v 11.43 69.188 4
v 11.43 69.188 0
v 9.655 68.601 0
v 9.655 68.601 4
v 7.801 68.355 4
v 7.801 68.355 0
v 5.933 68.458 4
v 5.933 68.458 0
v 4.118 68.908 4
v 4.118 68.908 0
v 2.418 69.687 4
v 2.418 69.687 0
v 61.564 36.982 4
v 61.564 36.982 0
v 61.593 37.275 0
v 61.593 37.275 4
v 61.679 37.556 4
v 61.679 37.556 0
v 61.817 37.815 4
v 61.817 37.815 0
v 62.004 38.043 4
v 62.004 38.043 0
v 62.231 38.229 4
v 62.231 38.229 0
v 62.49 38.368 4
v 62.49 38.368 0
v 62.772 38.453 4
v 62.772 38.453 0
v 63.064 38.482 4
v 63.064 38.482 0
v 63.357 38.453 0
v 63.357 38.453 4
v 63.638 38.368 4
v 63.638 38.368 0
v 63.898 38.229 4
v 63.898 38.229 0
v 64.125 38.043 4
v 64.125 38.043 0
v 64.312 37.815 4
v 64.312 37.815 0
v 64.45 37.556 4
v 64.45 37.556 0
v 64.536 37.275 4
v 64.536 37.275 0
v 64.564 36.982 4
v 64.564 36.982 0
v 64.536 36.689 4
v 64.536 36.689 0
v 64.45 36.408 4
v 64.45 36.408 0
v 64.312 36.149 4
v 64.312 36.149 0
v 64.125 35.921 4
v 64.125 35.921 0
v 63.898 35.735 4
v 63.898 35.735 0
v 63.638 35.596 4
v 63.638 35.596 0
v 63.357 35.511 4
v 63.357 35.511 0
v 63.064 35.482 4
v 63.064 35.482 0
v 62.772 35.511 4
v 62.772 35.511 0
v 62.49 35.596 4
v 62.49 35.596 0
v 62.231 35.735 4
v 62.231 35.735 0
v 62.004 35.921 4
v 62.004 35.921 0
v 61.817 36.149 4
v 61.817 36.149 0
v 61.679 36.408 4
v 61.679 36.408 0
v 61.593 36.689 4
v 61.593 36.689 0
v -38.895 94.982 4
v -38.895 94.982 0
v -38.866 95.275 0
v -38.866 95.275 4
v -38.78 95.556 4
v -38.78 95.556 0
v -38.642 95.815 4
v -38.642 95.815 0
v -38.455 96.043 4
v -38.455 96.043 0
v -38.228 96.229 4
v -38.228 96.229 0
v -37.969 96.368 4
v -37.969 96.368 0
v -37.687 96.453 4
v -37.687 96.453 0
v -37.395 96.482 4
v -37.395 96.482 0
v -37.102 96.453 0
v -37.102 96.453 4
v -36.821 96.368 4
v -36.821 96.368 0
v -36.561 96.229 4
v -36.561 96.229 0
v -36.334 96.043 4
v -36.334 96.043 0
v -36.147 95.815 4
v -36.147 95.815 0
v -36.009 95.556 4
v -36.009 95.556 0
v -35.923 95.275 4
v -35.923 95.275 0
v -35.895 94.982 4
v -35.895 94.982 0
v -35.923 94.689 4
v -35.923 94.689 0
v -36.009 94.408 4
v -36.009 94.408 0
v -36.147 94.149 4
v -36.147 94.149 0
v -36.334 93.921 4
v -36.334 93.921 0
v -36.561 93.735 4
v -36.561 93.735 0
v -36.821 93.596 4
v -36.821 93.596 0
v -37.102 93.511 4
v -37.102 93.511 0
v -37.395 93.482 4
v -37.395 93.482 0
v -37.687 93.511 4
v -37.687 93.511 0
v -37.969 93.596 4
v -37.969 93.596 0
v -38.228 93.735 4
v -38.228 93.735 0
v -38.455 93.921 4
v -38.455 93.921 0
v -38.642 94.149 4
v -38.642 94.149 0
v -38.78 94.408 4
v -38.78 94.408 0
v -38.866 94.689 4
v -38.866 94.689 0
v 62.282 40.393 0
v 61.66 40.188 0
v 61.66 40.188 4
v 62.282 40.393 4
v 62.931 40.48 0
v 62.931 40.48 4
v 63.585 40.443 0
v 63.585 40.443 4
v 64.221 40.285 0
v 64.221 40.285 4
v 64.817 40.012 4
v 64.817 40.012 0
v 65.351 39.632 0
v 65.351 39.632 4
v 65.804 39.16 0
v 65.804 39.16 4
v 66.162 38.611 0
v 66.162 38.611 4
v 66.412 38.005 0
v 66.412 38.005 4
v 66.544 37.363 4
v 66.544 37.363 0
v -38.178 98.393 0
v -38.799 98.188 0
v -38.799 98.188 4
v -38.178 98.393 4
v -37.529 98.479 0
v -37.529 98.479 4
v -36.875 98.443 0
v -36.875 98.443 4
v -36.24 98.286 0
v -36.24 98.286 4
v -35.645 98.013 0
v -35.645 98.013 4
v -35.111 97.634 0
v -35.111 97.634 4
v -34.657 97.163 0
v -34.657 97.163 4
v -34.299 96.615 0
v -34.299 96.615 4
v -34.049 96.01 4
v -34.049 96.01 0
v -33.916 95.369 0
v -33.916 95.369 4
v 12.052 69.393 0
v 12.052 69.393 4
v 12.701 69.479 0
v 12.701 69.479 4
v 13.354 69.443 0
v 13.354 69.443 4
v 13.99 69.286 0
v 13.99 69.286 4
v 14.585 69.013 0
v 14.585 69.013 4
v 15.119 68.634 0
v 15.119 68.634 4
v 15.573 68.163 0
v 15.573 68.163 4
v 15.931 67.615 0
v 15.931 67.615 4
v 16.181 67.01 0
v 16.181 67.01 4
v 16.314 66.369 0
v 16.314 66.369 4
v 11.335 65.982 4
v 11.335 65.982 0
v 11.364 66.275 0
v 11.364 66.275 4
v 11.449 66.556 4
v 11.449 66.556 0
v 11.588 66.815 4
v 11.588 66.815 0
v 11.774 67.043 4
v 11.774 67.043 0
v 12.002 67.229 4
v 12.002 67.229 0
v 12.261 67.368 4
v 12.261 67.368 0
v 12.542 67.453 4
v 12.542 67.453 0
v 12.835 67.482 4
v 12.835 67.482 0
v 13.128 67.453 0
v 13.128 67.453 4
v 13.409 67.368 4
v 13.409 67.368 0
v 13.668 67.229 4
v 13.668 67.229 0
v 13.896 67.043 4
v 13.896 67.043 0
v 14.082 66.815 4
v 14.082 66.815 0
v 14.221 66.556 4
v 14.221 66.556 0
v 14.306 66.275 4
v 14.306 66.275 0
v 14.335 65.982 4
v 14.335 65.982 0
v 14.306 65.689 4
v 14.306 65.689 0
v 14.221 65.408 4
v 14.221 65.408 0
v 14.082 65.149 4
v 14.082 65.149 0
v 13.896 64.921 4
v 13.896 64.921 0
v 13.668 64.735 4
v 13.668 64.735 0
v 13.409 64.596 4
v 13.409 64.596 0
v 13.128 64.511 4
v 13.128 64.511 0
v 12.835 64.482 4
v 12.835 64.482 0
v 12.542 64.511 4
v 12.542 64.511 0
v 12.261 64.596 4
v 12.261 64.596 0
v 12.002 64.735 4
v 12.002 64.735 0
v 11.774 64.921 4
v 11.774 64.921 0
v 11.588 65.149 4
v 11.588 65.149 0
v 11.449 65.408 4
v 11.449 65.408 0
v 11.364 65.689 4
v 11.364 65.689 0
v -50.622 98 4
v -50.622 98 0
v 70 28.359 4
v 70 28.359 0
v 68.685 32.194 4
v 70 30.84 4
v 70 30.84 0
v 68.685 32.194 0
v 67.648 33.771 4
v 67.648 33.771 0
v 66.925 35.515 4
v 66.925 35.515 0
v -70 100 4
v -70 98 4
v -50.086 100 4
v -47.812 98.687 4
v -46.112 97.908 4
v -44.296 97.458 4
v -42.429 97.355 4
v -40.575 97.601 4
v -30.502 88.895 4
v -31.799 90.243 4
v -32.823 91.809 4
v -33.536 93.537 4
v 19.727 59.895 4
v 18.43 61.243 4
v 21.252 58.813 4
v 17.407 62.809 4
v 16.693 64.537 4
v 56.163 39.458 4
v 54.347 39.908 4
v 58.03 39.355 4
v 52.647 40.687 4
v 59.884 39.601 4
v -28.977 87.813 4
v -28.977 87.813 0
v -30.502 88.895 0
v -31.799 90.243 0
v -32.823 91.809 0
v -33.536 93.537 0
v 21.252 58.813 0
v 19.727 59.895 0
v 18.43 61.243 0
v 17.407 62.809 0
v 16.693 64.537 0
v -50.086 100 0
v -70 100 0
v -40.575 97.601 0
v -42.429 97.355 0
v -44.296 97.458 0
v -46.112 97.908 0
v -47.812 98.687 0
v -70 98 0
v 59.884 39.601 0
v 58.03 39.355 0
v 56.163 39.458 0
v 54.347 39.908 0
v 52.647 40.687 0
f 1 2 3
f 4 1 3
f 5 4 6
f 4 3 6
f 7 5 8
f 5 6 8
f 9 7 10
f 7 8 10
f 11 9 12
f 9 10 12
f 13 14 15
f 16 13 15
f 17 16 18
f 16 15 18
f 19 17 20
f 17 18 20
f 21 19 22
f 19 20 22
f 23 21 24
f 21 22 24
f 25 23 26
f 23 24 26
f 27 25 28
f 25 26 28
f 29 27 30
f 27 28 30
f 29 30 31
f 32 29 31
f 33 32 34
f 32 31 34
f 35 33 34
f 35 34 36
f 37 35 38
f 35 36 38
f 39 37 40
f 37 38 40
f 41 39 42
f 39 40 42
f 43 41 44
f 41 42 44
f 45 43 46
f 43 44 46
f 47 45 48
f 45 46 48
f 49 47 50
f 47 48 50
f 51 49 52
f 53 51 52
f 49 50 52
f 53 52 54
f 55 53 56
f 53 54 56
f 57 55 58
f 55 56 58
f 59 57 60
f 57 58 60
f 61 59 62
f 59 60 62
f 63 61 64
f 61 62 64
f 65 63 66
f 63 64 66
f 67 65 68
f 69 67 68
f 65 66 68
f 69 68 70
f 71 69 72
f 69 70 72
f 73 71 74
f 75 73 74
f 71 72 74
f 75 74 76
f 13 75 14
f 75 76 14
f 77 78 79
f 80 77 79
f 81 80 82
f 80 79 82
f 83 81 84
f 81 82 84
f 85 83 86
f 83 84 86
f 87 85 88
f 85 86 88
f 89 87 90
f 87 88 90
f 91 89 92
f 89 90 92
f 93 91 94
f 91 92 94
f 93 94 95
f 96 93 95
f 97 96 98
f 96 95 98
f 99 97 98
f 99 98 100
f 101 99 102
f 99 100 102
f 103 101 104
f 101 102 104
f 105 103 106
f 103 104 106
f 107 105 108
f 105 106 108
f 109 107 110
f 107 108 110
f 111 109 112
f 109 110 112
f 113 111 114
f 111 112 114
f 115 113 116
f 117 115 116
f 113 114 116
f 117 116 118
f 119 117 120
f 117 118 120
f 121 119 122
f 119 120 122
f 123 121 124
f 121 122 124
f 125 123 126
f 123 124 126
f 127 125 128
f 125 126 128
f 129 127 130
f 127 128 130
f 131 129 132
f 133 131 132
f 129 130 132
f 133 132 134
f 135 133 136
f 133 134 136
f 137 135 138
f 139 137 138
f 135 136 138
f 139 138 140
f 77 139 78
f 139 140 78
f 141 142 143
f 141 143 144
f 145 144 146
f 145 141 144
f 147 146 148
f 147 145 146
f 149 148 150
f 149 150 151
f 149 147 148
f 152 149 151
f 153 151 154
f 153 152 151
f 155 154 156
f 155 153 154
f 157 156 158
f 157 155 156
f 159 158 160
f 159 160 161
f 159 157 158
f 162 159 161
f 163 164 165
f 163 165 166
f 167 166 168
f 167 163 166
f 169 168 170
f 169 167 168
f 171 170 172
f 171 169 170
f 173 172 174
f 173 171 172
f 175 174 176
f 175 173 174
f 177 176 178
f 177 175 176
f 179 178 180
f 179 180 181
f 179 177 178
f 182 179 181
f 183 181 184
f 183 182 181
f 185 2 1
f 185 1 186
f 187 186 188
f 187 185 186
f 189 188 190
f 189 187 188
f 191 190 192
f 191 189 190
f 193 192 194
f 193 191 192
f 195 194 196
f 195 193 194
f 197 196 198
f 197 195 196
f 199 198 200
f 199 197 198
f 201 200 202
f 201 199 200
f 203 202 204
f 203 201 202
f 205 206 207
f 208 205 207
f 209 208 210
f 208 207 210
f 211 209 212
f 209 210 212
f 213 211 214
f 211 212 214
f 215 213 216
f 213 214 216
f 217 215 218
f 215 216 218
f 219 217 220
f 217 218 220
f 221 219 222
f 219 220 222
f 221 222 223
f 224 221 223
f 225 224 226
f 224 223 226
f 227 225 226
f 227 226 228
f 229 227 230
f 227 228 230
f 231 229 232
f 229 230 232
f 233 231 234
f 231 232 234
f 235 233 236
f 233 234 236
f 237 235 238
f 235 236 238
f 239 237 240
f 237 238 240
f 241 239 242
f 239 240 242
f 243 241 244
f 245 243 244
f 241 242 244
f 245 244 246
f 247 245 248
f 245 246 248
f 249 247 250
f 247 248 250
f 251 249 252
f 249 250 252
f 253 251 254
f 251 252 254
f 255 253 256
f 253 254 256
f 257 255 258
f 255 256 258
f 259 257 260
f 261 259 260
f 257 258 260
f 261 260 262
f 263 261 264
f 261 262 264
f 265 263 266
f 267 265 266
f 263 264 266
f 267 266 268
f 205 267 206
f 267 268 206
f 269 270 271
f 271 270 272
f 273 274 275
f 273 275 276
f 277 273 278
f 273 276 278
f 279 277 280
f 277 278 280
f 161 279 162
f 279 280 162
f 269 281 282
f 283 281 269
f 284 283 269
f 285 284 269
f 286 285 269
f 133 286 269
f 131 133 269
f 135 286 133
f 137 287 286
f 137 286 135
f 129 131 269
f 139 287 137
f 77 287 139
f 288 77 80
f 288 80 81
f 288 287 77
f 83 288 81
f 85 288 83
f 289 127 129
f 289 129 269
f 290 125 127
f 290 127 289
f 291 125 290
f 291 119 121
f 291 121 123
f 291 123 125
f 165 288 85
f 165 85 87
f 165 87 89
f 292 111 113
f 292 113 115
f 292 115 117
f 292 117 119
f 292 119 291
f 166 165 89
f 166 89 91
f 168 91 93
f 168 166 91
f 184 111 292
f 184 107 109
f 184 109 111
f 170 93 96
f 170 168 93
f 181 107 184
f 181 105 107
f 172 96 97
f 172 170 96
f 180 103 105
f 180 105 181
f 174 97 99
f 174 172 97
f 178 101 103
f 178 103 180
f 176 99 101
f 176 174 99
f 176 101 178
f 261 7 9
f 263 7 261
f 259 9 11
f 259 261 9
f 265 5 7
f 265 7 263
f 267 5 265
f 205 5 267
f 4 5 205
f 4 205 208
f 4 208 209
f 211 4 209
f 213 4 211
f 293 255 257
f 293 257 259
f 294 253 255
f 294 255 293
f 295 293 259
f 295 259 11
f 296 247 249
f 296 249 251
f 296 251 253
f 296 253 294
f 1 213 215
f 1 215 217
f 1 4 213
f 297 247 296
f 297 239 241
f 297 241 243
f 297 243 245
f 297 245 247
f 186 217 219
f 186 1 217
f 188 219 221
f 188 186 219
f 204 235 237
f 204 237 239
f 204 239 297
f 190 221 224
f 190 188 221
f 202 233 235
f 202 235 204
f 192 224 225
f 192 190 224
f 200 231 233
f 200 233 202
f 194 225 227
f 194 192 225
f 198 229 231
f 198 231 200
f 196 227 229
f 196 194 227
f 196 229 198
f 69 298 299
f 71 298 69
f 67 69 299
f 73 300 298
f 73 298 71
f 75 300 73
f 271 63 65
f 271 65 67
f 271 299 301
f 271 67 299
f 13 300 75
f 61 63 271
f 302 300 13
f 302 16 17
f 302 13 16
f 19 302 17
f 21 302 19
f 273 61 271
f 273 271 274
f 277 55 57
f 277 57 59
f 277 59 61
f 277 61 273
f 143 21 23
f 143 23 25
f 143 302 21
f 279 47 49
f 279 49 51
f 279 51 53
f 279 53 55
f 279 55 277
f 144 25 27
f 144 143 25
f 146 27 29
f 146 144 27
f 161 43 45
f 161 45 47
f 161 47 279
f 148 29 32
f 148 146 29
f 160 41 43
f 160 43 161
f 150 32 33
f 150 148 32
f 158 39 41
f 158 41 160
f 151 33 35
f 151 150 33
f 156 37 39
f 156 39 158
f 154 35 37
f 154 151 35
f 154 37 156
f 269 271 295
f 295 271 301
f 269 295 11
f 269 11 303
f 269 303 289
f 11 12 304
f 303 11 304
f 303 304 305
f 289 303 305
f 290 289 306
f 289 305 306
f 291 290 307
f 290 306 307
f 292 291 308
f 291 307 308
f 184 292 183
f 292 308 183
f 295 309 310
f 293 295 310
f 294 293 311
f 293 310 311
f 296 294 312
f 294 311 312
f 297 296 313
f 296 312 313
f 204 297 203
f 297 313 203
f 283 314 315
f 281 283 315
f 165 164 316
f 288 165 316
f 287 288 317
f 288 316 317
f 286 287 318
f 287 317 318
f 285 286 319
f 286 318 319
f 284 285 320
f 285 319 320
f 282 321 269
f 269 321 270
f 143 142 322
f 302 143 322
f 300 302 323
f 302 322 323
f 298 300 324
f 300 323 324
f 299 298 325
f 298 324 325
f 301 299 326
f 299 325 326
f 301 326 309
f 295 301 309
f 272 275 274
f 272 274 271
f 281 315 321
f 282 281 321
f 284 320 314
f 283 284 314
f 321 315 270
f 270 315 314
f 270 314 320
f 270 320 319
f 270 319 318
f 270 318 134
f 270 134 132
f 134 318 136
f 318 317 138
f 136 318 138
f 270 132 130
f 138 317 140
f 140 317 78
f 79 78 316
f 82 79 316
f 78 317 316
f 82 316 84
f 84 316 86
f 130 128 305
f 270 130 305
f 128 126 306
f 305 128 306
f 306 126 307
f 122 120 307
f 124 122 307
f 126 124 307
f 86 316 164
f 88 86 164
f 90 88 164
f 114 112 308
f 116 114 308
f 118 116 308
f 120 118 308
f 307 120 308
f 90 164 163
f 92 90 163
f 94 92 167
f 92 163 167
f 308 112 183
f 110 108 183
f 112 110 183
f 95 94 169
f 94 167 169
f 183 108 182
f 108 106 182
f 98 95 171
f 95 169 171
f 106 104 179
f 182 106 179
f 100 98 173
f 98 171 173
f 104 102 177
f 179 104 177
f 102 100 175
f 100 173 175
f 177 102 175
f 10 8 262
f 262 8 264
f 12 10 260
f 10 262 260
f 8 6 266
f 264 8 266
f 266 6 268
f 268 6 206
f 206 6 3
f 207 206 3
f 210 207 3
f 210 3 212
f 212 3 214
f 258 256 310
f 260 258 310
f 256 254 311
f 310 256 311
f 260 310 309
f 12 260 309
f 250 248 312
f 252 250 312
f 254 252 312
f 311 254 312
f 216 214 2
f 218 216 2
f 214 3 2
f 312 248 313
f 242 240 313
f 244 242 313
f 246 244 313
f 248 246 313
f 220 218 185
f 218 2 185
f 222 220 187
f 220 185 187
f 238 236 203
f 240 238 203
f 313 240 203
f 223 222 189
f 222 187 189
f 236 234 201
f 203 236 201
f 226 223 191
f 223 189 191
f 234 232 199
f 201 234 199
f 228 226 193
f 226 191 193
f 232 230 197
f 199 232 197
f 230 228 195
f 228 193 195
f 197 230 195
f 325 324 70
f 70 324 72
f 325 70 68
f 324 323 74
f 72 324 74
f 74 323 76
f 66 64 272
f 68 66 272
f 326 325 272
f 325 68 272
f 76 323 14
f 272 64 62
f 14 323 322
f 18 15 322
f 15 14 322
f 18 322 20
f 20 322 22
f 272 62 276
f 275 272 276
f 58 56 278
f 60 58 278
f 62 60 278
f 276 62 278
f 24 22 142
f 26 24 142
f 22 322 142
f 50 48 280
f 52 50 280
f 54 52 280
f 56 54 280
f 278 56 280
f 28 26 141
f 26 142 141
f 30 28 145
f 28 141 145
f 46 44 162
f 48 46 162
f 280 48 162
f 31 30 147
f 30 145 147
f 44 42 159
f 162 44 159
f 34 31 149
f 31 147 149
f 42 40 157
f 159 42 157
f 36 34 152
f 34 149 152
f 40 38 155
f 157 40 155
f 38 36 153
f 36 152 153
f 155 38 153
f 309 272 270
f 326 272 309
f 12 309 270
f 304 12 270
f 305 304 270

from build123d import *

# Parameters (mm, degrees)
EXTRUDE_THIN1_DEPTH = 4
SKETCH4_R           = 1.5
BOSS_EXTRUDE1_DEPTH = 4
FILLET1_DEPTH       = 4
CUT_EXTRUDE2_START  = -4
CUT_EXTRUDE2_DEPTH  = 4


with BuildPart() as part:
    # Sketch1 → Extrude-Thin1 (new body)
    with BuildSketch(Plane.XY):
        Polygon((-70, 98), (-50.621778265, 98), (70, 28.358983849), (71, 30.091034656), (-50.08587988, 100), (-70, 100), align=None)
    extrude(amount=EXTRUDE_THIN1_DEPTH)

    # Sketch4 → Boss-Extrude1 (add)
    # profile 1 of 9: a face of its own
    with BuildSketch(Plane(origin=(0, 0, 0), x_dir=(-1, 0, 0), z_dir=(0, 0, -1))):
        with BuildLine():
            ThreePointArc((40.894536929, 94.982050808), (40.775277321, 95.887917465), (40.425625842, 96.732050808))
            ThreePointArc((40.425625842, 96.732050808), (35.644536929, 98.013139721), (34.363448016, 93.232050808))
            ThreePointArc((34.363448016, 93.232050808), (35.026593255, 92.40467952), (35.907068336, 91.813859338))
            Line((35.907068336, 91.813859338), (40.882005522, 94.686140662))
            ThreePointArc((40.882005522, 94.686140662), (40.891402674, 94.833963122), (40.894536929, 94.982050808))
        make_face()
        with Locations((37.394536929, 94.982050808)):
            Circle(SKETCH4_R, mode=Mode.SUBTRACT)
    # profile 2 of 9: a face of its own
    with BuildSketch(Plane(origin=(0, 0, 0), x_dir=(-1, 0, 0), z_dir=(0, 0, -1))):
        with BuildLine():
            Line((41.425625842, 95), (40.425625842, 96.732050808))
            ThreePointArc((40.425625842, 96.732050808), (40.775277321, 95.887917465), (40.894536929, 94.982050808))
            ThreePointArc((40.894536929, 94.982050808), (40.891402674, 94.833963122), (40.882005522, 94.686140662))
            Line((40.882005522, 94.686140662), (41.425625842, 95))
        make_face()
    # profile 3 of 9: a face of its own
    with BuildSketch(Plane(origin=(0, 0, 0), x_dir=(-1, 0, 0), z_dir=(0, 0, -1))):
        with BuildLine():
            ThreePointArc((35.907068336, 91.813859338), (35.026593255, 92.40467952), (34.363448016, 93.232050808))
            Line((34.363448016, 93.232050808), (35.363448016, 91.5))
            Line((35.363448016, 91.5), (35.907068336, 91.813859338))
        make_face()
    # profile 4 of 9: a face of its own
    with BuildSketch(Plane(origin=(0, 0, 0), x_dir=(-1, 0, 0), z_dir=(0, 0, -1))):
        with BuildLine():
            ThreePointArc((-9.334936491, 65.982050808), (-9.454196099, 66.887917465), (-9.803847577, 67.732050808))
            ThreePointArc((-9.803847577, 67.732050808), (-14.584936491, 69.013139721), (-15.866025404, 64.232050808))
            ThreePointArc((-15.866025404, 64.232050808), (-15.202880165, 63.40467952), (-14.322405083, 62.813859338))
            Line((-14.322405083, 62.813859338), (-9.347467898, 65.686140662))
            ThreePointArc((-9.347467898, 65.686140662), (-9.338070746, 65.833963122), (-9.334936491, 65.982050808))
        make_face()
        with Locations((-12.834936491, 65.982050808)):
            Circle(SKETCH4_R, mode=Mode.SUBTRACT)
    # profile 5 of 9: a face of its own
    with BuildSketch(Plane(origin=(0, 0, 0), x_dir=(-1, 0, 0), z_dir=(0, 0, -1))):
        with BuildLine():
            ThreePointArc((-14.322405083, 62.813859338), (-15.202880165, 63.40467952), (-15.866025404, 64.232050808))
            Line((-15.866025404, 64.232050808), (-14.866025404, 62.5))
            Line((-14.866025404, 62.5), (-14.322405083, 62.813859338))
        make_face()
    # profile 6 of 9: a face of its own
    with BuildSketch(Plane(origin=(0, 0, 0), x_dir=(-1, 0, 0), z_dir=(0, 0, -1))):
        with BuildLine():
            Line((-9.347467898, 65.686140662), (-8.803847577, 66))
            Line((-8.803847577, 66), (-9.803847577, 67.732050808))
            ThreePointArc((-9.803847577, 67.732050808), (-9.454196099, 66.887917465), (-9.334936491, 65.982050808))
            ThreePointArc((-9.334936491, 65.982050808), (-9.338070746, 65.833963122), (-9.347467898, 65.686140662))
        make_face()
    # profile 7 of 9: a face of its own
    with BuildSketch(Plane(origin=(0, 0, 0), x_dir=(-1, 0, 0), z_dir=(0, 0, -1))):
        with BuildLine():
            ThreePointArc((-59.56440991, 36.982050808), (-59.683669518, 37.887917465), (-60.033320997, 38.732050808))
            ThreePointArc((-60.033320997, 38.732050808), (-64.81440991, 40.013139721), (-66.095498823, 35.232050808))
            ThreePointArc((-66.095498823, 35.232050808), (-65.432353584, 34.40467952), (-64.551878503, 33.813859338))
            Line((-64.551878503, 33.813859338), (-59.576941317, 36.686140662))
            ThreePointArc((-59.576941317, 36.686140662), (-59.567544165, 36.833963122), (-59.56440991, 36.982050808))
        make_face()
        with Locations((-63.06440991, 36.982050808)):
            Circle(SKETCH4_R, mode=Mode.SUBTRACT)
    # profile 8 of 9: a face of its own
    with BuildSketch(Plane(origin=(0, 0, 0), x_dir=(-1, 0, 0), z_dir=(0, 0, -1))):
        with BuildLine():
            ThreePointArc((-64.551878503, 33.813859338), (-65.432353584, 34.40467952), (-66.095498823, 35.232050808))
            Line((-66.095498823, 35.232050808), (-65.095498823, 33.5))
            Line((-65.095498823, 33.5), (-64.551878503, 33.813859338))
        make_face()
    # profile 9 of 9: a face of its own
    with BuildSketch(Plane(origin=(0, 0, 0), x_dir=(-1, 0, 0), z_dir=(0, 0, -1))):
        with BuildLine():
            Line((-59.576941317, 36.686140662), (-59.033320997, 37))
            Line((-59.033320997, 37), (-60.033320997, 38.732050808))
            ThreePointArc((-60.033320997, 38.732050808), (-59.683669518, 37.887917465), (-59.56440991, 36.982050808))
            ThreePointArc((-59.56440991, 36.982050808), (-59.567544165, 36.833963122), (-59.576941317, 36.686140662))
        make_face()
    extrude(amount=-BOSS_EXTRUDE1_DEPTH)

    # Fillet1: read off the stored shape, not the designer's step
    # Fillet1 outline → Fillet1 (add)
    with BuildSketch(Plane.XY):
        with BuildLine():
            ThreePointArc((60.033320997, 38.732050808), (60.730207809, 39.590019471), (61.659897736, 40.18788074))
            ThreePointArc((61.659897736, 40.18788074), (57.09391383, 39.362702083), (52.647005809, 40.687140793))
            Line((52.647005809, 40.687140793), (59.033320997, 37))
            Line((59.033320997, 37), (60.033320997, 38.732050808))
        make_face()
        with BuildLine():
            ThreePointArc((-40.425625842, 96.732050808), (-39.72873903, 97.590019471), (-38.799049103, 98.18788074))
            ThreePointArc((-38.799049103, 98.18788074), (-43.365033009, 97.362702083), (-47.81194103, 98.687140793))
            Line((-47.81194103, 98.687140793), (-41.425625842, 95))
            Line((-41.425625842, 95), (-40.425625842, 96.732050808))
        make_face()
        with BuildLine():
            Line((-35.363448016, 91.5), (-28.977132828, 87.812859207))
            ThreePointArc((-28.977132828, 87.812859207), (-32.347584407, 91.001775167), (-33.915950681, 95.368622551))
            ThreePointArc((-33.915950681, 95.368622551), (-33.968868764, 94.264556822), (-34.363448016, 93.232050808))
            Line((-34.363448016, 93.232050808), (-35.363448016, 91.5))
        make_face()
        with BuildLine():
            ThreePointArc((9.803847577, 67.732050808), (10.500734389, 68.590019472), (11.430424316, 69.18788074))
            ThreePointArc((11.430424316, 69.18788074), (6.864440411, 68.362702083), (2.41753239, 69.687140793))
            Line((2.41753239, 69.687140793), (8.803847577, 66))
            Line((8.803847577, 66), (9.803847577, 67.732050808))
        make_face()
        with BuildLine():
            Line((14.866025404, 62.5), (21.252340591, 58.812859207))
            ThreePointArc((21.252340591, 58.812859207), (17.881889013, 62.001775167), (16.313522739, 66.368622551))
            ThreePointArc((16.313522739, 66.368622551), (16.260604656, 65.264556823), (15.866025404, 64.232050808))
            Line((15.866025404, 64.232050808), (14.866025404, 62.5))
        make_face()
        with BuildLine():
            ThreePointArc((71, 30.091034656), (67.95755311, 33.22829735), (66.543566366, 37.363456571))
            ThreePointArc((66.543566366, 37.363456571), (66.489544407, 36.262013533), (66.095498823, 35.232050808))
            Line((66.095498823, 35.232050808), (65.095498823, 33.5))
            Line((65.095498823, 33.5), (71, 30.091034656))
        make_face()
    extrude(amount=FILLET1_DEPTH)

    # Sketch5 → Cut-Extrude2 (cut)
    with BuildSketch(Plane.XY.offset(4).offset(CUT_EXTRUDE2_START)):
        with BuildLine():
            Line((71, 30.091034656), (70, 28.358983849))
            Line((70, 28.358983849), (72.530271162, 28.358983849))
            Line((72.530271162, 28.358983849), (72.530271162, 31.310199794))
            Line((72.530271162, 31.310199794), (70, 31.310199794))
            Line((70, 31.310199794), (70, 30.840200363))
            ThreePointArc((70, 30.840200363), (70.488287532, 30.449983494), (71, 30.091034656))
        make_face()
        with BuildLine():
            Line((70, 30.840200363), (70, 28.358983849))
            Line((70, 28.358983849), (71, 30.091034656))
            ThreePointArc((71, 30.091034656), (70.488287532, 30.449983494), (70, 30.840200363))
        make_face()
    extrude(amount=CUT_EXTRUDE2_DEPTH, mode=Mode.SUBTRACT)


solid = part.part
